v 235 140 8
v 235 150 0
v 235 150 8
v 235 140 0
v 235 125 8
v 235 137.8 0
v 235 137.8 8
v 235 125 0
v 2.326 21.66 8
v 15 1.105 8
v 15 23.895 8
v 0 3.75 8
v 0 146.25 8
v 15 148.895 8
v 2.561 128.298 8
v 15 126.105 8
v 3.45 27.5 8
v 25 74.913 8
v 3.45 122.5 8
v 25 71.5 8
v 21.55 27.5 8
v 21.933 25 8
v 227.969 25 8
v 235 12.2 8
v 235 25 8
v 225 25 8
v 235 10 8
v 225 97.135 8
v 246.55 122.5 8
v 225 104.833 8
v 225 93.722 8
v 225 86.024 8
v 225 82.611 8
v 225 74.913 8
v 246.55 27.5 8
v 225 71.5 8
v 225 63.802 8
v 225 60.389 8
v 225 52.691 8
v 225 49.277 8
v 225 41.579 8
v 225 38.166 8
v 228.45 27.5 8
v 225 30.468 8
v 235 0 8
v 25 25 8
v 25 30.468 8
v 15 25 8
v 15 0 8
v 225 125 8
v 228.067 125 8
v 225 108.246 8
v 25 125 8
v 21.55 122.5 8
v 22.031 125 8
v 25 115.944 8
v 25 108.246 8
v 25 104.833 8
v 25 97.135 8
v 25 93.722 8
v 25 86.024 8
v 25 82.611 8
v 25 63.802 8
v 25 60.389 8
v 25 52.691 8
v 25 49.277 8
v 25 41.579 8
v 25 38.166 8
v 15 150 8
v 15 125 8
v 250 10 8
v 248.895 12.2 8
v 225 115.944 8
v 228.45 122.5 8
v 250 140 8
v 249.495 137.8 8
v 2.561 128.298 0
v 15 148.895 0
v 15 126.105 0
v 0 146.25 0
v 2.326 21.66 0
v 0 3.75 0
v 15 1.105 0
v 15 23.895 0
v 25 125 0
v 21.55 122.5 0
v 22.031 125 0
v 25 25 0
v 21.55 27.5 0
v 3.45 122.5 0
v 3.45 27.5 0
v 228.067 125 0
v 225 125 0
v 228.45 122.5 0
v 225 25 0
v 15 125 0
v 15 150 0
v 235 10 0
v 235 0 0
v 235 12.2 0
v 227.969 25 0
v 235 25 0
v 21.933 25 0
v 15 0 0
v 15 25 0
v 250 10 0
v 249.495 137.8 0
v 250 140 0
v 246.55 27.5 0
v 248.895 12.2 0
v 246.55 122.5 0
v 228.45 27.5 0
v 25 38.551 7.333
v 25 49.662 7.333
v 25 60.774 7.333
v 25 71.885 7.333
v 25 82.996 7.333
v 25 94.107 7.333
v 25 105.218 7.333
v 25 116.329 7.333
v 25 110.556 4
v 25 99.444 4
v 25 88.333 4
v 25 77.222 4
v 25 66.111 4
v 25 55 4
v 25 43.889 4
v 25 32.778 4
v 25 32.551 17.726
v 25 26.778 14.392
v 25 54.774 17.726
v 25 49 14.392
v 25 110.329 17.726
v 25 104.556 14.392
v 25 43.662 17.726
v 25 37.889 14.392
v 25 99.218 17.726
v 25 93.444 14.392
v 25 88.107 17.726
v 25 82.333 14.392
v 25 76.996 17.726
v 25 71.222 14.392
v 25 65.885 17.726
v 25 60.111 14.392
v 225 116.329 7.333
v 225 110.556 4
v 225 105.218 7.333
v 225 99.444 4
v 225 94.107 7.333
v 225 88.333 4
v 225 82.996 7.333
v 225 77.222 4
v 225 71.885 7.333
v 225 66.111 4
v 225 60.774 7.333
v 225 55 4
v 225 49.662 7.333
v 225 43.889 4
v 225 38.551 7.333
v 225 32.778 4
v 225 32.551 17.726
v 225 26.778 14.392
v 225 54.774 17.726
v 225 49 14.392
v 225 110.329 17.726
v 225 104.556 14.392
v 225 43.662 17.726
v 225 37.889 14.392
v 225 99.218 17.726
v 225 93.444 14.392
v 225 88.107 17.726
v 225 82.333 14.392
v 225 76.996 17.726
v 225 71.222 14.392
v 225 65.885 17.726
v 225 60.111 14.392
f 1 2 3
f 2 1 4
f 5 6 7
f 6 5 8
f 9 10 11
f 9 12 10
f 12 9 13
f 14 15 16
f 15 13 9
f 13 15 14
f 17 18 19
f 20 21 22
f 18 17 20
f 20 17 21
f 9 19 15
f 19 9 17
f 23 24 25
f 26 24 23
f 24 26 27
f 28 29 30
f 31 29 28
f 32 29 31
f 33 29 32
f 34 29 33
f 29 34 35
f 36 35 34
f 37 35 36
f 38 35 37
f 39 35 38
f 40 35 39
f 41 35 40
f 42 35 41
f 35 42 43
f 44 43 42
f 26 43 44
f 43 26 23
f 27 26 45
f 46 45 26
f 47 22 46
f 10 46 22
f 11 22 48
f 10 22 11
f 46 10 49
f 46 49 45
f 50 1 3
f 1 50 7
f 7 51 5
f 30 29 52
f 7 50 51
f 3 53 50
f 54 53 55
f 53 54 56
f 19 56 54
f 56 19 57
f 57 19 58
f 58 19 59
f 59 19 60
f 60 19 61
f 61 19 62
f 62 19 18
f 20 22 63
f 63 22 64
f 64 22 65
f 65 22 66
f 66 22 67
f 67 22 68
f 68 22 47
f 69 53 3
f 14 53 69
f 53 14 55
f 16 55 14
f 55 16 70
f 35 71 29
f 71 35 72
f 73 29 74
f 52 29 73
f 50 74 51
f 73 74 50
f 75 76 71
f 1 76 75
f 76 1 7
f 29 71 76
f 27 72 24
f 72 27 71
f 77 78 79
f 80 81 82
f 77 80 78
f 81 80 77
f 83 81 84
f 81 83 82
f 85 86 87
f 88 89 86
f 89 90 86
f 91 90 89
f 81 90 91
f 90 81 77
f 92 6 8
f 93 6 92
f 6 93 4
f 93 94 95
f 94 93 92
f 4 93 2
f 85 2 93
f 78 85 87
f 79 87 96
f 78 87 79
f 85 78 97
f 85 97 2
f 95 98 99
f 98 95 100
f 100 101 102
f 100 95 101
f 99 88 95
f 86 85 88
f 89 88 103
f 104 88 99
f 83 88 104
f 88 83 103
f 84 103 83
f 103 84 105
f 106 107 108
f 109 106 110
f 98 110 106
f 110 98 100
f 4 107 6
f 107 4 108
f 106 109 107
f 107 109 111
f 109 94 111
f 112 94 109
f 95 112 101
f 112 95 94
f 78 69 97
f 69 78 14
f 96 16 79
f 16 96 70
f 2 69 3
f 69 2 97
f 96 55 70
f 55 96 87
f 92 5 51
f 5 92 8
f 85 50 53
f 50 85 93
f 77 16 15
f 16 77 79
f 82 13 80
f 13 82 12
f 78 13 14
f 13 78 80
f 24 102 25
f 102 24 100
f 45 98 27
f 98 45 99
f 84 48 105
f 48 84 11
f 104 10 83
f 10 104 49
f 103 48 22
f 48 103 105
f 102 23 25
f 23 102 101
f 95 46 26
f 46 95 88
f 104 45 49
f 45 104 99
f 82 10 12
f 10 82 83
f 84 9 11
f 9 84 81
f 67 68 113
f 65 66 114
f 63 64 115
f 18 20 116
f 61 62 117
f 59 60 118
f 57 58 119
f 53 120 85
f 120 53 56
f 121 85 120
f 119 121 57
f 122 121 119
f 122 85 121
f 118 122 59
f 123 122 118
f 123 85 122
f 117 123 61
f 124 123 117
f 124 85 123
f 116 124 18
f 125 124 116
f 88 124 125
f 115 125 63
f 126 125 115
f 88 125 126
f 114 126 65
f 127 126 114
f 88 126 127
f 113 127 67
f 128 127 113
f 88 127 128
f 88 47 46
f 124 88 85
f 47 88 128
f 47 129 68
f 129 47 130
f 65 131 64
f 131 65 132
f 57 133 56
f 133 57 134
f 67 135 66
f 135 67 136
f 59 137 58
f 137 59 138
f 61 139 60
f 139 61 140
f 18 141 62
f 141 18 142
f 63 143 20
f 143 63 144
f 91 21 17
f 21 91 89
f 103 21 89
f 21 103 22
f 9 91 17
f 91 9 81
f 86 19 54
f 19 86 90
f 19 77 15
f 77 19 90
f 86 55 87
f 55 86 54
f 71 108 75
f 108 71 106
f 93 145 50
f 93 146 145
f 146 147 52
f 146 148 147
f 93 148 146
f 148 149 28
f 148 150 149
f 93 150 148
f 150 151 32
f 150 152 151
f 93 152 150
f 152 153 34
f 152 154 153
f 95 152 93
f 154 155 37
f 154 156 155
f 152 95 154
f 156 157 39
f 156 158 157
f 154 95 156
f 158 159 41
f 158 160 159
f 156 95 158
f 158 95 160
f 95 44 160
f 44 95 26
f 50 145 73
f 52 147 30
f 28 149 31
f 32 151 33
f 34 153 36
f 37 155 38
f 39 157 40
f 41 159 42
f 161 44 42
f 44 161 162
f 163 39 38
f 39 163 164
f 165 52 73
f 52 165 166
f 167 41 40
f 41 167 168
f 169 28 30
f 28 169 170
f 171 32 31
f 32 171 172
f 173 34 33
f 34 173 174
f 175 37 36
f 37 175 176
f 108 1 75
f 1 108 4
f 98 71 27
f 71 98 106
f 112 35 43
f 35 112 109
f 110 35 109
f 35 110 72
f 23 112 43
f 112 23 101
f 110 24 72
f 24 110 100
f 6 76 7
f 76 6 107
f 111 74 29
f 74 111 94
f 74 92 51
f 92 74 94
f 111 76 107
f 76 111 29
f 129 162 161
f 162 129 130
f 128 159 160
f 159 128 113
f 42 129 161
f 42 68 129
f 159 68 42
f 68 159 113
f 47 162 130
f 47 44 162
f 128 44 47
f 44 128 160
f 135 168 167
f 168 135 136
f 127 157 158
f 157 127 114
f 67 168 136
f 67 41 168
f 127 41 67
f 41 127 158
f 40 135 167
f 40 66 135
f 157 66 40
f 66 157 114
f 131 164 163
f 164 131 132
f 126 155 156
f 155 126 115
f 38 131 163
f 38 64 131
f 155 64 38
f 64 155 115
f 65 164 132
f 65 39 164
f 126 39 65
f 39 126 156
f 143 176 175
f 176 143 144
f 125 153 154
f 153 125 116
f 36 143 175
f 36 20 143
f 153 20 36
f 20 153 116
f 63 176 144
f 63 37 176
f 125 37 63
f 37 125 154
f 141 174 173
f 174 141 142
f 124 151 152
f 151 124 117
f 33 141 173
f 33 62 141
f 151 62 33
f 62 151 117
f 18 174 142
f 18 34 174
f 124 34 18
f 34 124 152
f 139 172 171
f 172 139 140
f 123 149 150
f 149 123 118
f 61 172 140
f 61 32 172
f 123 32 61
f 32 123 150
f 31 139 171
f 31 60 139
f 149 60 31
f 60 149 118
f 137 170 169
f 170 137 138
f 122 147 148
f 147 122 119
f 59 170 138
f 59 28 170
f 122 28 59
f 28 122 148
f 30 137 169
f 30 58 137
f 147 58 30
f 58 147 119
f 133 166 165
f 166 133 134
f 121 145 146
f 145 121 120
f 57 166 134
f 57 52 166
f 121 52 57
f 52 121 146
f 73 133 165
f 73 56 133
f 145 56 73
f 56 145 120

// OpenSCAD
// Air Vent Cover with Dovetail Locking Frame
// Decorative cover for a standard 10 x 4 in wall duct
// Frame assembles from 4 pieces with interlocking dovetail joints

/* [Vent Opening Dimensions] */
vent_width = 200;        // Width of vent opening (mm)
vent_height = 100;       // Height of vent opening (mm)

/* [Frame Dimensions] */
frame_width = 25;        // Width of frame border (mm)
frame_thickness = 8;     // Thickness/depth of frame (mm)

/* [Dovetail Joint Parameters] */
dovetail_length = 15;    // Length of dovetail projection (mm)
dovetail_angle = 10;     // Angle of dovetail (degrees)
dovetail_clearance = 0.3; // Clearance for fit (mm)

/* [Grill Parameters] */
slat_count = 8;          // Number of horizontal slats
slat_thickness = 3;      // Thickness of each slat (mm)
slat_angle = 30;         // Angle of slats (degrees, 0 = horizontal)

/* [Display Options] */
show_assembled = true;   // Show assembled view
show_exploded = false;   // Show exploded view
explode_distance = 40;   // Distance for exploded view (mm)
show_individual = false; // Show individual pieces laid flat

// Calculated dimensions
outer_width = vent_width + 2 * frame_width;
outer_height = vent_height + 2 * frame_width;

// Main rendering
if (show_assembled) {
    color("SaddleBrown") assembled_frame();
    color("Sienna") grill();
}

if (show_exploded) {
    translate([outer_width + 50, 0, 0])
        exploded_frame();
}

if (show_individual) {
    translate([0, -outer_height - 50, 0])
        individual_pieces();
}

// ============================================
// DOVETAIL JOINT MODULES
// ============================================

// Single dovetail (male) profile - the pin
module dovetail_pin(length, width, thickness, angle, clearance=0) {
    // Tapered dovetail shape
    bottom_width = width - 2 * clearance;
    top_width = bottom_width + 2 * length * tan(angle);

    linear_extrude(height = thickness - clearance)
        polygon([
            [0, 0],
            [length, (width - top_width) / 2 + clearance],
            [length, (width + top_width) / 2 - clearance],
            [0, width]
        ]);
}

// Single dovetail (female) socket - the slot
module dovetail_socket(length, width, thickness, angle, clearance=0) {
    // Socket is slightly larger for clearance
    bottom_width = width;
    top_width = width + 2 * length * tan(angle);
    extra = clearance;

    translate([-0.1, -extra, -extra])
    linear_extrude(height = thickness + 2*extra)
        polygon([
            [0, 0],
            [length + extra, (width - top_width) / 2 - extra],
            [length + extra, (width + top_width) / 2 + extra],
            [0, width + 2*extra]
        ]);
}

// ============================================
// FRAME PIECE MODULES
// ============================================

// Top frame piece with dovetail pins on both ends
module top_frame_piece() {
    pin_width = frame_width * 0.7;

    difference() {
        union() {
            // Main bar (shorter to account for joints)
            cube([outer_width - 2*dovetail_length, frame_width, frame_thickness]);

            // Left dovetail pin
            translate([-dovetail_length, (frame_width - pin_width)/2, 0])
                dovetail_pin(dovetail_length, pin_width, frame_thickness, dovetail_angle);

            // Right dovetail pin
            translate([outer_width - 2*dovetail_length, frame_width - (frame_width - pin_width)/2, 0])
                rotate([0, 0, 180])
                    dovetail_pin(dovetail_length, pin_width, frame_thickness, dovetail_angle);
        }
    }
}

// Bottom frame piece (identical to top)
module bottom_frame_piece() {
    top_frame_piece();
}

// Left frame piece with dovetail sockets on both ends
module left_frame_piece() {
    pin_width = frame_width * 0.7;

    difference() {
        // Main bar
        cube([frame_width, vent_height + 2*dovetail_length, frame_thickness]);

        // Bottom dovetail socket
        translate([frame_width/2 - pin_width/2, -0.1, 0])
            rotate([0, 0, -90])
                translate([-pin_width, 0, 0])
                    dovetail_socket(dovetail_length, pin_width, frame_thickness,
                                   dovetail_angle, dovetail_clearance);

        // Top dovetail socket
        translate([frame_width/2 + pin_width/2, vent_height + 2*dovetail_length + 0.1, 0])
            rotate([0, 0, 90])
                translate([-pin_width, 0, 0])
                    dovetail_socket(dovetail_length, pin_width, frame_thickness,
                                   dovetail_angle, dovetail_clearance);
    }
}

// Right frame piece (identical to left)
module right_frame_piece() {
    left_frame_piece();
}

// ============================================
// ASSEMBLY MODULES
// ============================================

module assembled_frame() {
    // Top piece
    translate([dovetail_length, vent_height + frame_width, 0])
        top_frame_piece();

    // Bottom piece
    translate([dovetail_length, 0, 0])
        bottom_frame_piece();

    // Left piece
    translate([0, frame_width - dovetail_length, 0])
        left_frame_piece();

    // Right piece
    translate([outer_width - frame_width, frame_width - dovetail_length, 0])
        right_frame_piece();
}

module exploded_frame() {
    // Top piece - moved up
    translate([dovetail_length, vent_height + frame_width + explode_distance, 0])
        color("SaddleBrown") top_frame_piece();

    // Bottom piece - moved down
    translate([dovetail_length, -explode_distance, 0])
        color("Peru") bottom_frame_piece();

    // Left piece - moved left
    translate([-explode_distance, frame_width - dovetail_length, 0])
        color("Sienna") left_frame_piece();

    // Right piece - moved right
    translate([outer_width - frame_width + explode_distance, frame_width - dovetail_length, 0])
        color("Chocolate") right_frame_piece();
}

module individual_pieces() {
    // Layout pieces flat for printing
    spacing = 20;

    // Top piece
    color("SaddleBrown") top_frame_piece();

    // Bottom piece
    translate([0, -frame_width - spacing, 0])
        color("Peru") bottom_frame_piece();

    // Left piece (rotated for compact layout)
    translate([outer_width - 2*dovetail_length + spacing, 0, 0])
        rotate([0, 0, -90])
            color("Sienna") left_frame_piece();

    // Right piece
    translate([outer_width - 2*dovetail_length + spacing + vent_height + 2*dovetail_length + spacing, 0, 0])
        rotate([0, 0, -90])
            color("Chocolate") right_frame_piece();
}

// ============================================
// GRILL MODULE
// ============================================

module grill() {
    slat_spacing = vent_height / (slat_count + 1);
    slat_width = slat_spacing * 0.6;

    translate([frame_width, frame_width, 0]) {
        for (i = [1:slat_count]) {
            translate([0, i * slat_spacing - slat_width/2, frame_thickness/2])
                rotate([slat_angle, 0, 0])
                    cube([vent_width, slat_width, frame_thickness * 1.5]);
        }
    }
}

// ============================================
// ALTERNATIVE: SLIDING DOVETAIL DESIGN
// ============================================
// This version uses a sliding dovetail where vertical
// pieces slide into horizontal pieces from above

module sliding_dovetail_rail(length) {
    // Rail that accepts a sliding dovetail
    rail_depth = frame_thickness * 0.6;
    rail_width_bottom = frame_width * 0.4;
    rail_width_top = rail_width_bottom + 2 * rail_depth * tan(dovetail_angle);

    translate([0, 0, frame_thickness])
    rotate([180, 0, 0])
    linear_extrude(height = rail_depth)
        polygon([
            [0, (frame_width - rail_width_bottom)/2],
            [0, (frame_width + rail_width_bottom)/2],
            [length, (frame_width + rail_width_top)/2],
            [length, (frame_width - rail_width_top)/2]
        ]);
}

module sliding_dovetail_tongue(length) {
    // Tongue that slides into the rail
    tongue_depth = frame_thickness * 0.6 - dovetail_clearance;
    tongue_width_bottom = frame_width * 0.4 - dovetail_clearance;
    tongue_width_top = tongue_width_bottom + 2 * tongue_depth * tan(dovetail_angle) - dovetail_clearance;

    linear_extrude(height = tongue_depth)
        polygon([
            [0, (frame_width - tongue_width_bottom)/2],
            [0, (frame_width + tongue_width_bottom)/2],
            [length, (frame_width + tongue_width_top)/2],
            [length, (frame_width - tongue_width_top)/2]
        ]);
}

// ============================================
// INFORMATION TEXT
// ============================================
echo("=== Air Vent Cover Dimensions ===");
echo(str("Vent Opening: ", vent_width, " x ", vent_height, " mm"));
echo(str("Outer Frame: ", outer_width, " x ", outer_height, " mm"));
echo(str("Frame Border Width: ", frame_width, " mm"));
echo(str("Frame Thickness: ", frame_thickness, " mm"));
echo(str("Dovetail Length: ", dovetail_length, " mm"));
echo(str("Dovetail Angle: ", dovetail_angle, " degrees"));
